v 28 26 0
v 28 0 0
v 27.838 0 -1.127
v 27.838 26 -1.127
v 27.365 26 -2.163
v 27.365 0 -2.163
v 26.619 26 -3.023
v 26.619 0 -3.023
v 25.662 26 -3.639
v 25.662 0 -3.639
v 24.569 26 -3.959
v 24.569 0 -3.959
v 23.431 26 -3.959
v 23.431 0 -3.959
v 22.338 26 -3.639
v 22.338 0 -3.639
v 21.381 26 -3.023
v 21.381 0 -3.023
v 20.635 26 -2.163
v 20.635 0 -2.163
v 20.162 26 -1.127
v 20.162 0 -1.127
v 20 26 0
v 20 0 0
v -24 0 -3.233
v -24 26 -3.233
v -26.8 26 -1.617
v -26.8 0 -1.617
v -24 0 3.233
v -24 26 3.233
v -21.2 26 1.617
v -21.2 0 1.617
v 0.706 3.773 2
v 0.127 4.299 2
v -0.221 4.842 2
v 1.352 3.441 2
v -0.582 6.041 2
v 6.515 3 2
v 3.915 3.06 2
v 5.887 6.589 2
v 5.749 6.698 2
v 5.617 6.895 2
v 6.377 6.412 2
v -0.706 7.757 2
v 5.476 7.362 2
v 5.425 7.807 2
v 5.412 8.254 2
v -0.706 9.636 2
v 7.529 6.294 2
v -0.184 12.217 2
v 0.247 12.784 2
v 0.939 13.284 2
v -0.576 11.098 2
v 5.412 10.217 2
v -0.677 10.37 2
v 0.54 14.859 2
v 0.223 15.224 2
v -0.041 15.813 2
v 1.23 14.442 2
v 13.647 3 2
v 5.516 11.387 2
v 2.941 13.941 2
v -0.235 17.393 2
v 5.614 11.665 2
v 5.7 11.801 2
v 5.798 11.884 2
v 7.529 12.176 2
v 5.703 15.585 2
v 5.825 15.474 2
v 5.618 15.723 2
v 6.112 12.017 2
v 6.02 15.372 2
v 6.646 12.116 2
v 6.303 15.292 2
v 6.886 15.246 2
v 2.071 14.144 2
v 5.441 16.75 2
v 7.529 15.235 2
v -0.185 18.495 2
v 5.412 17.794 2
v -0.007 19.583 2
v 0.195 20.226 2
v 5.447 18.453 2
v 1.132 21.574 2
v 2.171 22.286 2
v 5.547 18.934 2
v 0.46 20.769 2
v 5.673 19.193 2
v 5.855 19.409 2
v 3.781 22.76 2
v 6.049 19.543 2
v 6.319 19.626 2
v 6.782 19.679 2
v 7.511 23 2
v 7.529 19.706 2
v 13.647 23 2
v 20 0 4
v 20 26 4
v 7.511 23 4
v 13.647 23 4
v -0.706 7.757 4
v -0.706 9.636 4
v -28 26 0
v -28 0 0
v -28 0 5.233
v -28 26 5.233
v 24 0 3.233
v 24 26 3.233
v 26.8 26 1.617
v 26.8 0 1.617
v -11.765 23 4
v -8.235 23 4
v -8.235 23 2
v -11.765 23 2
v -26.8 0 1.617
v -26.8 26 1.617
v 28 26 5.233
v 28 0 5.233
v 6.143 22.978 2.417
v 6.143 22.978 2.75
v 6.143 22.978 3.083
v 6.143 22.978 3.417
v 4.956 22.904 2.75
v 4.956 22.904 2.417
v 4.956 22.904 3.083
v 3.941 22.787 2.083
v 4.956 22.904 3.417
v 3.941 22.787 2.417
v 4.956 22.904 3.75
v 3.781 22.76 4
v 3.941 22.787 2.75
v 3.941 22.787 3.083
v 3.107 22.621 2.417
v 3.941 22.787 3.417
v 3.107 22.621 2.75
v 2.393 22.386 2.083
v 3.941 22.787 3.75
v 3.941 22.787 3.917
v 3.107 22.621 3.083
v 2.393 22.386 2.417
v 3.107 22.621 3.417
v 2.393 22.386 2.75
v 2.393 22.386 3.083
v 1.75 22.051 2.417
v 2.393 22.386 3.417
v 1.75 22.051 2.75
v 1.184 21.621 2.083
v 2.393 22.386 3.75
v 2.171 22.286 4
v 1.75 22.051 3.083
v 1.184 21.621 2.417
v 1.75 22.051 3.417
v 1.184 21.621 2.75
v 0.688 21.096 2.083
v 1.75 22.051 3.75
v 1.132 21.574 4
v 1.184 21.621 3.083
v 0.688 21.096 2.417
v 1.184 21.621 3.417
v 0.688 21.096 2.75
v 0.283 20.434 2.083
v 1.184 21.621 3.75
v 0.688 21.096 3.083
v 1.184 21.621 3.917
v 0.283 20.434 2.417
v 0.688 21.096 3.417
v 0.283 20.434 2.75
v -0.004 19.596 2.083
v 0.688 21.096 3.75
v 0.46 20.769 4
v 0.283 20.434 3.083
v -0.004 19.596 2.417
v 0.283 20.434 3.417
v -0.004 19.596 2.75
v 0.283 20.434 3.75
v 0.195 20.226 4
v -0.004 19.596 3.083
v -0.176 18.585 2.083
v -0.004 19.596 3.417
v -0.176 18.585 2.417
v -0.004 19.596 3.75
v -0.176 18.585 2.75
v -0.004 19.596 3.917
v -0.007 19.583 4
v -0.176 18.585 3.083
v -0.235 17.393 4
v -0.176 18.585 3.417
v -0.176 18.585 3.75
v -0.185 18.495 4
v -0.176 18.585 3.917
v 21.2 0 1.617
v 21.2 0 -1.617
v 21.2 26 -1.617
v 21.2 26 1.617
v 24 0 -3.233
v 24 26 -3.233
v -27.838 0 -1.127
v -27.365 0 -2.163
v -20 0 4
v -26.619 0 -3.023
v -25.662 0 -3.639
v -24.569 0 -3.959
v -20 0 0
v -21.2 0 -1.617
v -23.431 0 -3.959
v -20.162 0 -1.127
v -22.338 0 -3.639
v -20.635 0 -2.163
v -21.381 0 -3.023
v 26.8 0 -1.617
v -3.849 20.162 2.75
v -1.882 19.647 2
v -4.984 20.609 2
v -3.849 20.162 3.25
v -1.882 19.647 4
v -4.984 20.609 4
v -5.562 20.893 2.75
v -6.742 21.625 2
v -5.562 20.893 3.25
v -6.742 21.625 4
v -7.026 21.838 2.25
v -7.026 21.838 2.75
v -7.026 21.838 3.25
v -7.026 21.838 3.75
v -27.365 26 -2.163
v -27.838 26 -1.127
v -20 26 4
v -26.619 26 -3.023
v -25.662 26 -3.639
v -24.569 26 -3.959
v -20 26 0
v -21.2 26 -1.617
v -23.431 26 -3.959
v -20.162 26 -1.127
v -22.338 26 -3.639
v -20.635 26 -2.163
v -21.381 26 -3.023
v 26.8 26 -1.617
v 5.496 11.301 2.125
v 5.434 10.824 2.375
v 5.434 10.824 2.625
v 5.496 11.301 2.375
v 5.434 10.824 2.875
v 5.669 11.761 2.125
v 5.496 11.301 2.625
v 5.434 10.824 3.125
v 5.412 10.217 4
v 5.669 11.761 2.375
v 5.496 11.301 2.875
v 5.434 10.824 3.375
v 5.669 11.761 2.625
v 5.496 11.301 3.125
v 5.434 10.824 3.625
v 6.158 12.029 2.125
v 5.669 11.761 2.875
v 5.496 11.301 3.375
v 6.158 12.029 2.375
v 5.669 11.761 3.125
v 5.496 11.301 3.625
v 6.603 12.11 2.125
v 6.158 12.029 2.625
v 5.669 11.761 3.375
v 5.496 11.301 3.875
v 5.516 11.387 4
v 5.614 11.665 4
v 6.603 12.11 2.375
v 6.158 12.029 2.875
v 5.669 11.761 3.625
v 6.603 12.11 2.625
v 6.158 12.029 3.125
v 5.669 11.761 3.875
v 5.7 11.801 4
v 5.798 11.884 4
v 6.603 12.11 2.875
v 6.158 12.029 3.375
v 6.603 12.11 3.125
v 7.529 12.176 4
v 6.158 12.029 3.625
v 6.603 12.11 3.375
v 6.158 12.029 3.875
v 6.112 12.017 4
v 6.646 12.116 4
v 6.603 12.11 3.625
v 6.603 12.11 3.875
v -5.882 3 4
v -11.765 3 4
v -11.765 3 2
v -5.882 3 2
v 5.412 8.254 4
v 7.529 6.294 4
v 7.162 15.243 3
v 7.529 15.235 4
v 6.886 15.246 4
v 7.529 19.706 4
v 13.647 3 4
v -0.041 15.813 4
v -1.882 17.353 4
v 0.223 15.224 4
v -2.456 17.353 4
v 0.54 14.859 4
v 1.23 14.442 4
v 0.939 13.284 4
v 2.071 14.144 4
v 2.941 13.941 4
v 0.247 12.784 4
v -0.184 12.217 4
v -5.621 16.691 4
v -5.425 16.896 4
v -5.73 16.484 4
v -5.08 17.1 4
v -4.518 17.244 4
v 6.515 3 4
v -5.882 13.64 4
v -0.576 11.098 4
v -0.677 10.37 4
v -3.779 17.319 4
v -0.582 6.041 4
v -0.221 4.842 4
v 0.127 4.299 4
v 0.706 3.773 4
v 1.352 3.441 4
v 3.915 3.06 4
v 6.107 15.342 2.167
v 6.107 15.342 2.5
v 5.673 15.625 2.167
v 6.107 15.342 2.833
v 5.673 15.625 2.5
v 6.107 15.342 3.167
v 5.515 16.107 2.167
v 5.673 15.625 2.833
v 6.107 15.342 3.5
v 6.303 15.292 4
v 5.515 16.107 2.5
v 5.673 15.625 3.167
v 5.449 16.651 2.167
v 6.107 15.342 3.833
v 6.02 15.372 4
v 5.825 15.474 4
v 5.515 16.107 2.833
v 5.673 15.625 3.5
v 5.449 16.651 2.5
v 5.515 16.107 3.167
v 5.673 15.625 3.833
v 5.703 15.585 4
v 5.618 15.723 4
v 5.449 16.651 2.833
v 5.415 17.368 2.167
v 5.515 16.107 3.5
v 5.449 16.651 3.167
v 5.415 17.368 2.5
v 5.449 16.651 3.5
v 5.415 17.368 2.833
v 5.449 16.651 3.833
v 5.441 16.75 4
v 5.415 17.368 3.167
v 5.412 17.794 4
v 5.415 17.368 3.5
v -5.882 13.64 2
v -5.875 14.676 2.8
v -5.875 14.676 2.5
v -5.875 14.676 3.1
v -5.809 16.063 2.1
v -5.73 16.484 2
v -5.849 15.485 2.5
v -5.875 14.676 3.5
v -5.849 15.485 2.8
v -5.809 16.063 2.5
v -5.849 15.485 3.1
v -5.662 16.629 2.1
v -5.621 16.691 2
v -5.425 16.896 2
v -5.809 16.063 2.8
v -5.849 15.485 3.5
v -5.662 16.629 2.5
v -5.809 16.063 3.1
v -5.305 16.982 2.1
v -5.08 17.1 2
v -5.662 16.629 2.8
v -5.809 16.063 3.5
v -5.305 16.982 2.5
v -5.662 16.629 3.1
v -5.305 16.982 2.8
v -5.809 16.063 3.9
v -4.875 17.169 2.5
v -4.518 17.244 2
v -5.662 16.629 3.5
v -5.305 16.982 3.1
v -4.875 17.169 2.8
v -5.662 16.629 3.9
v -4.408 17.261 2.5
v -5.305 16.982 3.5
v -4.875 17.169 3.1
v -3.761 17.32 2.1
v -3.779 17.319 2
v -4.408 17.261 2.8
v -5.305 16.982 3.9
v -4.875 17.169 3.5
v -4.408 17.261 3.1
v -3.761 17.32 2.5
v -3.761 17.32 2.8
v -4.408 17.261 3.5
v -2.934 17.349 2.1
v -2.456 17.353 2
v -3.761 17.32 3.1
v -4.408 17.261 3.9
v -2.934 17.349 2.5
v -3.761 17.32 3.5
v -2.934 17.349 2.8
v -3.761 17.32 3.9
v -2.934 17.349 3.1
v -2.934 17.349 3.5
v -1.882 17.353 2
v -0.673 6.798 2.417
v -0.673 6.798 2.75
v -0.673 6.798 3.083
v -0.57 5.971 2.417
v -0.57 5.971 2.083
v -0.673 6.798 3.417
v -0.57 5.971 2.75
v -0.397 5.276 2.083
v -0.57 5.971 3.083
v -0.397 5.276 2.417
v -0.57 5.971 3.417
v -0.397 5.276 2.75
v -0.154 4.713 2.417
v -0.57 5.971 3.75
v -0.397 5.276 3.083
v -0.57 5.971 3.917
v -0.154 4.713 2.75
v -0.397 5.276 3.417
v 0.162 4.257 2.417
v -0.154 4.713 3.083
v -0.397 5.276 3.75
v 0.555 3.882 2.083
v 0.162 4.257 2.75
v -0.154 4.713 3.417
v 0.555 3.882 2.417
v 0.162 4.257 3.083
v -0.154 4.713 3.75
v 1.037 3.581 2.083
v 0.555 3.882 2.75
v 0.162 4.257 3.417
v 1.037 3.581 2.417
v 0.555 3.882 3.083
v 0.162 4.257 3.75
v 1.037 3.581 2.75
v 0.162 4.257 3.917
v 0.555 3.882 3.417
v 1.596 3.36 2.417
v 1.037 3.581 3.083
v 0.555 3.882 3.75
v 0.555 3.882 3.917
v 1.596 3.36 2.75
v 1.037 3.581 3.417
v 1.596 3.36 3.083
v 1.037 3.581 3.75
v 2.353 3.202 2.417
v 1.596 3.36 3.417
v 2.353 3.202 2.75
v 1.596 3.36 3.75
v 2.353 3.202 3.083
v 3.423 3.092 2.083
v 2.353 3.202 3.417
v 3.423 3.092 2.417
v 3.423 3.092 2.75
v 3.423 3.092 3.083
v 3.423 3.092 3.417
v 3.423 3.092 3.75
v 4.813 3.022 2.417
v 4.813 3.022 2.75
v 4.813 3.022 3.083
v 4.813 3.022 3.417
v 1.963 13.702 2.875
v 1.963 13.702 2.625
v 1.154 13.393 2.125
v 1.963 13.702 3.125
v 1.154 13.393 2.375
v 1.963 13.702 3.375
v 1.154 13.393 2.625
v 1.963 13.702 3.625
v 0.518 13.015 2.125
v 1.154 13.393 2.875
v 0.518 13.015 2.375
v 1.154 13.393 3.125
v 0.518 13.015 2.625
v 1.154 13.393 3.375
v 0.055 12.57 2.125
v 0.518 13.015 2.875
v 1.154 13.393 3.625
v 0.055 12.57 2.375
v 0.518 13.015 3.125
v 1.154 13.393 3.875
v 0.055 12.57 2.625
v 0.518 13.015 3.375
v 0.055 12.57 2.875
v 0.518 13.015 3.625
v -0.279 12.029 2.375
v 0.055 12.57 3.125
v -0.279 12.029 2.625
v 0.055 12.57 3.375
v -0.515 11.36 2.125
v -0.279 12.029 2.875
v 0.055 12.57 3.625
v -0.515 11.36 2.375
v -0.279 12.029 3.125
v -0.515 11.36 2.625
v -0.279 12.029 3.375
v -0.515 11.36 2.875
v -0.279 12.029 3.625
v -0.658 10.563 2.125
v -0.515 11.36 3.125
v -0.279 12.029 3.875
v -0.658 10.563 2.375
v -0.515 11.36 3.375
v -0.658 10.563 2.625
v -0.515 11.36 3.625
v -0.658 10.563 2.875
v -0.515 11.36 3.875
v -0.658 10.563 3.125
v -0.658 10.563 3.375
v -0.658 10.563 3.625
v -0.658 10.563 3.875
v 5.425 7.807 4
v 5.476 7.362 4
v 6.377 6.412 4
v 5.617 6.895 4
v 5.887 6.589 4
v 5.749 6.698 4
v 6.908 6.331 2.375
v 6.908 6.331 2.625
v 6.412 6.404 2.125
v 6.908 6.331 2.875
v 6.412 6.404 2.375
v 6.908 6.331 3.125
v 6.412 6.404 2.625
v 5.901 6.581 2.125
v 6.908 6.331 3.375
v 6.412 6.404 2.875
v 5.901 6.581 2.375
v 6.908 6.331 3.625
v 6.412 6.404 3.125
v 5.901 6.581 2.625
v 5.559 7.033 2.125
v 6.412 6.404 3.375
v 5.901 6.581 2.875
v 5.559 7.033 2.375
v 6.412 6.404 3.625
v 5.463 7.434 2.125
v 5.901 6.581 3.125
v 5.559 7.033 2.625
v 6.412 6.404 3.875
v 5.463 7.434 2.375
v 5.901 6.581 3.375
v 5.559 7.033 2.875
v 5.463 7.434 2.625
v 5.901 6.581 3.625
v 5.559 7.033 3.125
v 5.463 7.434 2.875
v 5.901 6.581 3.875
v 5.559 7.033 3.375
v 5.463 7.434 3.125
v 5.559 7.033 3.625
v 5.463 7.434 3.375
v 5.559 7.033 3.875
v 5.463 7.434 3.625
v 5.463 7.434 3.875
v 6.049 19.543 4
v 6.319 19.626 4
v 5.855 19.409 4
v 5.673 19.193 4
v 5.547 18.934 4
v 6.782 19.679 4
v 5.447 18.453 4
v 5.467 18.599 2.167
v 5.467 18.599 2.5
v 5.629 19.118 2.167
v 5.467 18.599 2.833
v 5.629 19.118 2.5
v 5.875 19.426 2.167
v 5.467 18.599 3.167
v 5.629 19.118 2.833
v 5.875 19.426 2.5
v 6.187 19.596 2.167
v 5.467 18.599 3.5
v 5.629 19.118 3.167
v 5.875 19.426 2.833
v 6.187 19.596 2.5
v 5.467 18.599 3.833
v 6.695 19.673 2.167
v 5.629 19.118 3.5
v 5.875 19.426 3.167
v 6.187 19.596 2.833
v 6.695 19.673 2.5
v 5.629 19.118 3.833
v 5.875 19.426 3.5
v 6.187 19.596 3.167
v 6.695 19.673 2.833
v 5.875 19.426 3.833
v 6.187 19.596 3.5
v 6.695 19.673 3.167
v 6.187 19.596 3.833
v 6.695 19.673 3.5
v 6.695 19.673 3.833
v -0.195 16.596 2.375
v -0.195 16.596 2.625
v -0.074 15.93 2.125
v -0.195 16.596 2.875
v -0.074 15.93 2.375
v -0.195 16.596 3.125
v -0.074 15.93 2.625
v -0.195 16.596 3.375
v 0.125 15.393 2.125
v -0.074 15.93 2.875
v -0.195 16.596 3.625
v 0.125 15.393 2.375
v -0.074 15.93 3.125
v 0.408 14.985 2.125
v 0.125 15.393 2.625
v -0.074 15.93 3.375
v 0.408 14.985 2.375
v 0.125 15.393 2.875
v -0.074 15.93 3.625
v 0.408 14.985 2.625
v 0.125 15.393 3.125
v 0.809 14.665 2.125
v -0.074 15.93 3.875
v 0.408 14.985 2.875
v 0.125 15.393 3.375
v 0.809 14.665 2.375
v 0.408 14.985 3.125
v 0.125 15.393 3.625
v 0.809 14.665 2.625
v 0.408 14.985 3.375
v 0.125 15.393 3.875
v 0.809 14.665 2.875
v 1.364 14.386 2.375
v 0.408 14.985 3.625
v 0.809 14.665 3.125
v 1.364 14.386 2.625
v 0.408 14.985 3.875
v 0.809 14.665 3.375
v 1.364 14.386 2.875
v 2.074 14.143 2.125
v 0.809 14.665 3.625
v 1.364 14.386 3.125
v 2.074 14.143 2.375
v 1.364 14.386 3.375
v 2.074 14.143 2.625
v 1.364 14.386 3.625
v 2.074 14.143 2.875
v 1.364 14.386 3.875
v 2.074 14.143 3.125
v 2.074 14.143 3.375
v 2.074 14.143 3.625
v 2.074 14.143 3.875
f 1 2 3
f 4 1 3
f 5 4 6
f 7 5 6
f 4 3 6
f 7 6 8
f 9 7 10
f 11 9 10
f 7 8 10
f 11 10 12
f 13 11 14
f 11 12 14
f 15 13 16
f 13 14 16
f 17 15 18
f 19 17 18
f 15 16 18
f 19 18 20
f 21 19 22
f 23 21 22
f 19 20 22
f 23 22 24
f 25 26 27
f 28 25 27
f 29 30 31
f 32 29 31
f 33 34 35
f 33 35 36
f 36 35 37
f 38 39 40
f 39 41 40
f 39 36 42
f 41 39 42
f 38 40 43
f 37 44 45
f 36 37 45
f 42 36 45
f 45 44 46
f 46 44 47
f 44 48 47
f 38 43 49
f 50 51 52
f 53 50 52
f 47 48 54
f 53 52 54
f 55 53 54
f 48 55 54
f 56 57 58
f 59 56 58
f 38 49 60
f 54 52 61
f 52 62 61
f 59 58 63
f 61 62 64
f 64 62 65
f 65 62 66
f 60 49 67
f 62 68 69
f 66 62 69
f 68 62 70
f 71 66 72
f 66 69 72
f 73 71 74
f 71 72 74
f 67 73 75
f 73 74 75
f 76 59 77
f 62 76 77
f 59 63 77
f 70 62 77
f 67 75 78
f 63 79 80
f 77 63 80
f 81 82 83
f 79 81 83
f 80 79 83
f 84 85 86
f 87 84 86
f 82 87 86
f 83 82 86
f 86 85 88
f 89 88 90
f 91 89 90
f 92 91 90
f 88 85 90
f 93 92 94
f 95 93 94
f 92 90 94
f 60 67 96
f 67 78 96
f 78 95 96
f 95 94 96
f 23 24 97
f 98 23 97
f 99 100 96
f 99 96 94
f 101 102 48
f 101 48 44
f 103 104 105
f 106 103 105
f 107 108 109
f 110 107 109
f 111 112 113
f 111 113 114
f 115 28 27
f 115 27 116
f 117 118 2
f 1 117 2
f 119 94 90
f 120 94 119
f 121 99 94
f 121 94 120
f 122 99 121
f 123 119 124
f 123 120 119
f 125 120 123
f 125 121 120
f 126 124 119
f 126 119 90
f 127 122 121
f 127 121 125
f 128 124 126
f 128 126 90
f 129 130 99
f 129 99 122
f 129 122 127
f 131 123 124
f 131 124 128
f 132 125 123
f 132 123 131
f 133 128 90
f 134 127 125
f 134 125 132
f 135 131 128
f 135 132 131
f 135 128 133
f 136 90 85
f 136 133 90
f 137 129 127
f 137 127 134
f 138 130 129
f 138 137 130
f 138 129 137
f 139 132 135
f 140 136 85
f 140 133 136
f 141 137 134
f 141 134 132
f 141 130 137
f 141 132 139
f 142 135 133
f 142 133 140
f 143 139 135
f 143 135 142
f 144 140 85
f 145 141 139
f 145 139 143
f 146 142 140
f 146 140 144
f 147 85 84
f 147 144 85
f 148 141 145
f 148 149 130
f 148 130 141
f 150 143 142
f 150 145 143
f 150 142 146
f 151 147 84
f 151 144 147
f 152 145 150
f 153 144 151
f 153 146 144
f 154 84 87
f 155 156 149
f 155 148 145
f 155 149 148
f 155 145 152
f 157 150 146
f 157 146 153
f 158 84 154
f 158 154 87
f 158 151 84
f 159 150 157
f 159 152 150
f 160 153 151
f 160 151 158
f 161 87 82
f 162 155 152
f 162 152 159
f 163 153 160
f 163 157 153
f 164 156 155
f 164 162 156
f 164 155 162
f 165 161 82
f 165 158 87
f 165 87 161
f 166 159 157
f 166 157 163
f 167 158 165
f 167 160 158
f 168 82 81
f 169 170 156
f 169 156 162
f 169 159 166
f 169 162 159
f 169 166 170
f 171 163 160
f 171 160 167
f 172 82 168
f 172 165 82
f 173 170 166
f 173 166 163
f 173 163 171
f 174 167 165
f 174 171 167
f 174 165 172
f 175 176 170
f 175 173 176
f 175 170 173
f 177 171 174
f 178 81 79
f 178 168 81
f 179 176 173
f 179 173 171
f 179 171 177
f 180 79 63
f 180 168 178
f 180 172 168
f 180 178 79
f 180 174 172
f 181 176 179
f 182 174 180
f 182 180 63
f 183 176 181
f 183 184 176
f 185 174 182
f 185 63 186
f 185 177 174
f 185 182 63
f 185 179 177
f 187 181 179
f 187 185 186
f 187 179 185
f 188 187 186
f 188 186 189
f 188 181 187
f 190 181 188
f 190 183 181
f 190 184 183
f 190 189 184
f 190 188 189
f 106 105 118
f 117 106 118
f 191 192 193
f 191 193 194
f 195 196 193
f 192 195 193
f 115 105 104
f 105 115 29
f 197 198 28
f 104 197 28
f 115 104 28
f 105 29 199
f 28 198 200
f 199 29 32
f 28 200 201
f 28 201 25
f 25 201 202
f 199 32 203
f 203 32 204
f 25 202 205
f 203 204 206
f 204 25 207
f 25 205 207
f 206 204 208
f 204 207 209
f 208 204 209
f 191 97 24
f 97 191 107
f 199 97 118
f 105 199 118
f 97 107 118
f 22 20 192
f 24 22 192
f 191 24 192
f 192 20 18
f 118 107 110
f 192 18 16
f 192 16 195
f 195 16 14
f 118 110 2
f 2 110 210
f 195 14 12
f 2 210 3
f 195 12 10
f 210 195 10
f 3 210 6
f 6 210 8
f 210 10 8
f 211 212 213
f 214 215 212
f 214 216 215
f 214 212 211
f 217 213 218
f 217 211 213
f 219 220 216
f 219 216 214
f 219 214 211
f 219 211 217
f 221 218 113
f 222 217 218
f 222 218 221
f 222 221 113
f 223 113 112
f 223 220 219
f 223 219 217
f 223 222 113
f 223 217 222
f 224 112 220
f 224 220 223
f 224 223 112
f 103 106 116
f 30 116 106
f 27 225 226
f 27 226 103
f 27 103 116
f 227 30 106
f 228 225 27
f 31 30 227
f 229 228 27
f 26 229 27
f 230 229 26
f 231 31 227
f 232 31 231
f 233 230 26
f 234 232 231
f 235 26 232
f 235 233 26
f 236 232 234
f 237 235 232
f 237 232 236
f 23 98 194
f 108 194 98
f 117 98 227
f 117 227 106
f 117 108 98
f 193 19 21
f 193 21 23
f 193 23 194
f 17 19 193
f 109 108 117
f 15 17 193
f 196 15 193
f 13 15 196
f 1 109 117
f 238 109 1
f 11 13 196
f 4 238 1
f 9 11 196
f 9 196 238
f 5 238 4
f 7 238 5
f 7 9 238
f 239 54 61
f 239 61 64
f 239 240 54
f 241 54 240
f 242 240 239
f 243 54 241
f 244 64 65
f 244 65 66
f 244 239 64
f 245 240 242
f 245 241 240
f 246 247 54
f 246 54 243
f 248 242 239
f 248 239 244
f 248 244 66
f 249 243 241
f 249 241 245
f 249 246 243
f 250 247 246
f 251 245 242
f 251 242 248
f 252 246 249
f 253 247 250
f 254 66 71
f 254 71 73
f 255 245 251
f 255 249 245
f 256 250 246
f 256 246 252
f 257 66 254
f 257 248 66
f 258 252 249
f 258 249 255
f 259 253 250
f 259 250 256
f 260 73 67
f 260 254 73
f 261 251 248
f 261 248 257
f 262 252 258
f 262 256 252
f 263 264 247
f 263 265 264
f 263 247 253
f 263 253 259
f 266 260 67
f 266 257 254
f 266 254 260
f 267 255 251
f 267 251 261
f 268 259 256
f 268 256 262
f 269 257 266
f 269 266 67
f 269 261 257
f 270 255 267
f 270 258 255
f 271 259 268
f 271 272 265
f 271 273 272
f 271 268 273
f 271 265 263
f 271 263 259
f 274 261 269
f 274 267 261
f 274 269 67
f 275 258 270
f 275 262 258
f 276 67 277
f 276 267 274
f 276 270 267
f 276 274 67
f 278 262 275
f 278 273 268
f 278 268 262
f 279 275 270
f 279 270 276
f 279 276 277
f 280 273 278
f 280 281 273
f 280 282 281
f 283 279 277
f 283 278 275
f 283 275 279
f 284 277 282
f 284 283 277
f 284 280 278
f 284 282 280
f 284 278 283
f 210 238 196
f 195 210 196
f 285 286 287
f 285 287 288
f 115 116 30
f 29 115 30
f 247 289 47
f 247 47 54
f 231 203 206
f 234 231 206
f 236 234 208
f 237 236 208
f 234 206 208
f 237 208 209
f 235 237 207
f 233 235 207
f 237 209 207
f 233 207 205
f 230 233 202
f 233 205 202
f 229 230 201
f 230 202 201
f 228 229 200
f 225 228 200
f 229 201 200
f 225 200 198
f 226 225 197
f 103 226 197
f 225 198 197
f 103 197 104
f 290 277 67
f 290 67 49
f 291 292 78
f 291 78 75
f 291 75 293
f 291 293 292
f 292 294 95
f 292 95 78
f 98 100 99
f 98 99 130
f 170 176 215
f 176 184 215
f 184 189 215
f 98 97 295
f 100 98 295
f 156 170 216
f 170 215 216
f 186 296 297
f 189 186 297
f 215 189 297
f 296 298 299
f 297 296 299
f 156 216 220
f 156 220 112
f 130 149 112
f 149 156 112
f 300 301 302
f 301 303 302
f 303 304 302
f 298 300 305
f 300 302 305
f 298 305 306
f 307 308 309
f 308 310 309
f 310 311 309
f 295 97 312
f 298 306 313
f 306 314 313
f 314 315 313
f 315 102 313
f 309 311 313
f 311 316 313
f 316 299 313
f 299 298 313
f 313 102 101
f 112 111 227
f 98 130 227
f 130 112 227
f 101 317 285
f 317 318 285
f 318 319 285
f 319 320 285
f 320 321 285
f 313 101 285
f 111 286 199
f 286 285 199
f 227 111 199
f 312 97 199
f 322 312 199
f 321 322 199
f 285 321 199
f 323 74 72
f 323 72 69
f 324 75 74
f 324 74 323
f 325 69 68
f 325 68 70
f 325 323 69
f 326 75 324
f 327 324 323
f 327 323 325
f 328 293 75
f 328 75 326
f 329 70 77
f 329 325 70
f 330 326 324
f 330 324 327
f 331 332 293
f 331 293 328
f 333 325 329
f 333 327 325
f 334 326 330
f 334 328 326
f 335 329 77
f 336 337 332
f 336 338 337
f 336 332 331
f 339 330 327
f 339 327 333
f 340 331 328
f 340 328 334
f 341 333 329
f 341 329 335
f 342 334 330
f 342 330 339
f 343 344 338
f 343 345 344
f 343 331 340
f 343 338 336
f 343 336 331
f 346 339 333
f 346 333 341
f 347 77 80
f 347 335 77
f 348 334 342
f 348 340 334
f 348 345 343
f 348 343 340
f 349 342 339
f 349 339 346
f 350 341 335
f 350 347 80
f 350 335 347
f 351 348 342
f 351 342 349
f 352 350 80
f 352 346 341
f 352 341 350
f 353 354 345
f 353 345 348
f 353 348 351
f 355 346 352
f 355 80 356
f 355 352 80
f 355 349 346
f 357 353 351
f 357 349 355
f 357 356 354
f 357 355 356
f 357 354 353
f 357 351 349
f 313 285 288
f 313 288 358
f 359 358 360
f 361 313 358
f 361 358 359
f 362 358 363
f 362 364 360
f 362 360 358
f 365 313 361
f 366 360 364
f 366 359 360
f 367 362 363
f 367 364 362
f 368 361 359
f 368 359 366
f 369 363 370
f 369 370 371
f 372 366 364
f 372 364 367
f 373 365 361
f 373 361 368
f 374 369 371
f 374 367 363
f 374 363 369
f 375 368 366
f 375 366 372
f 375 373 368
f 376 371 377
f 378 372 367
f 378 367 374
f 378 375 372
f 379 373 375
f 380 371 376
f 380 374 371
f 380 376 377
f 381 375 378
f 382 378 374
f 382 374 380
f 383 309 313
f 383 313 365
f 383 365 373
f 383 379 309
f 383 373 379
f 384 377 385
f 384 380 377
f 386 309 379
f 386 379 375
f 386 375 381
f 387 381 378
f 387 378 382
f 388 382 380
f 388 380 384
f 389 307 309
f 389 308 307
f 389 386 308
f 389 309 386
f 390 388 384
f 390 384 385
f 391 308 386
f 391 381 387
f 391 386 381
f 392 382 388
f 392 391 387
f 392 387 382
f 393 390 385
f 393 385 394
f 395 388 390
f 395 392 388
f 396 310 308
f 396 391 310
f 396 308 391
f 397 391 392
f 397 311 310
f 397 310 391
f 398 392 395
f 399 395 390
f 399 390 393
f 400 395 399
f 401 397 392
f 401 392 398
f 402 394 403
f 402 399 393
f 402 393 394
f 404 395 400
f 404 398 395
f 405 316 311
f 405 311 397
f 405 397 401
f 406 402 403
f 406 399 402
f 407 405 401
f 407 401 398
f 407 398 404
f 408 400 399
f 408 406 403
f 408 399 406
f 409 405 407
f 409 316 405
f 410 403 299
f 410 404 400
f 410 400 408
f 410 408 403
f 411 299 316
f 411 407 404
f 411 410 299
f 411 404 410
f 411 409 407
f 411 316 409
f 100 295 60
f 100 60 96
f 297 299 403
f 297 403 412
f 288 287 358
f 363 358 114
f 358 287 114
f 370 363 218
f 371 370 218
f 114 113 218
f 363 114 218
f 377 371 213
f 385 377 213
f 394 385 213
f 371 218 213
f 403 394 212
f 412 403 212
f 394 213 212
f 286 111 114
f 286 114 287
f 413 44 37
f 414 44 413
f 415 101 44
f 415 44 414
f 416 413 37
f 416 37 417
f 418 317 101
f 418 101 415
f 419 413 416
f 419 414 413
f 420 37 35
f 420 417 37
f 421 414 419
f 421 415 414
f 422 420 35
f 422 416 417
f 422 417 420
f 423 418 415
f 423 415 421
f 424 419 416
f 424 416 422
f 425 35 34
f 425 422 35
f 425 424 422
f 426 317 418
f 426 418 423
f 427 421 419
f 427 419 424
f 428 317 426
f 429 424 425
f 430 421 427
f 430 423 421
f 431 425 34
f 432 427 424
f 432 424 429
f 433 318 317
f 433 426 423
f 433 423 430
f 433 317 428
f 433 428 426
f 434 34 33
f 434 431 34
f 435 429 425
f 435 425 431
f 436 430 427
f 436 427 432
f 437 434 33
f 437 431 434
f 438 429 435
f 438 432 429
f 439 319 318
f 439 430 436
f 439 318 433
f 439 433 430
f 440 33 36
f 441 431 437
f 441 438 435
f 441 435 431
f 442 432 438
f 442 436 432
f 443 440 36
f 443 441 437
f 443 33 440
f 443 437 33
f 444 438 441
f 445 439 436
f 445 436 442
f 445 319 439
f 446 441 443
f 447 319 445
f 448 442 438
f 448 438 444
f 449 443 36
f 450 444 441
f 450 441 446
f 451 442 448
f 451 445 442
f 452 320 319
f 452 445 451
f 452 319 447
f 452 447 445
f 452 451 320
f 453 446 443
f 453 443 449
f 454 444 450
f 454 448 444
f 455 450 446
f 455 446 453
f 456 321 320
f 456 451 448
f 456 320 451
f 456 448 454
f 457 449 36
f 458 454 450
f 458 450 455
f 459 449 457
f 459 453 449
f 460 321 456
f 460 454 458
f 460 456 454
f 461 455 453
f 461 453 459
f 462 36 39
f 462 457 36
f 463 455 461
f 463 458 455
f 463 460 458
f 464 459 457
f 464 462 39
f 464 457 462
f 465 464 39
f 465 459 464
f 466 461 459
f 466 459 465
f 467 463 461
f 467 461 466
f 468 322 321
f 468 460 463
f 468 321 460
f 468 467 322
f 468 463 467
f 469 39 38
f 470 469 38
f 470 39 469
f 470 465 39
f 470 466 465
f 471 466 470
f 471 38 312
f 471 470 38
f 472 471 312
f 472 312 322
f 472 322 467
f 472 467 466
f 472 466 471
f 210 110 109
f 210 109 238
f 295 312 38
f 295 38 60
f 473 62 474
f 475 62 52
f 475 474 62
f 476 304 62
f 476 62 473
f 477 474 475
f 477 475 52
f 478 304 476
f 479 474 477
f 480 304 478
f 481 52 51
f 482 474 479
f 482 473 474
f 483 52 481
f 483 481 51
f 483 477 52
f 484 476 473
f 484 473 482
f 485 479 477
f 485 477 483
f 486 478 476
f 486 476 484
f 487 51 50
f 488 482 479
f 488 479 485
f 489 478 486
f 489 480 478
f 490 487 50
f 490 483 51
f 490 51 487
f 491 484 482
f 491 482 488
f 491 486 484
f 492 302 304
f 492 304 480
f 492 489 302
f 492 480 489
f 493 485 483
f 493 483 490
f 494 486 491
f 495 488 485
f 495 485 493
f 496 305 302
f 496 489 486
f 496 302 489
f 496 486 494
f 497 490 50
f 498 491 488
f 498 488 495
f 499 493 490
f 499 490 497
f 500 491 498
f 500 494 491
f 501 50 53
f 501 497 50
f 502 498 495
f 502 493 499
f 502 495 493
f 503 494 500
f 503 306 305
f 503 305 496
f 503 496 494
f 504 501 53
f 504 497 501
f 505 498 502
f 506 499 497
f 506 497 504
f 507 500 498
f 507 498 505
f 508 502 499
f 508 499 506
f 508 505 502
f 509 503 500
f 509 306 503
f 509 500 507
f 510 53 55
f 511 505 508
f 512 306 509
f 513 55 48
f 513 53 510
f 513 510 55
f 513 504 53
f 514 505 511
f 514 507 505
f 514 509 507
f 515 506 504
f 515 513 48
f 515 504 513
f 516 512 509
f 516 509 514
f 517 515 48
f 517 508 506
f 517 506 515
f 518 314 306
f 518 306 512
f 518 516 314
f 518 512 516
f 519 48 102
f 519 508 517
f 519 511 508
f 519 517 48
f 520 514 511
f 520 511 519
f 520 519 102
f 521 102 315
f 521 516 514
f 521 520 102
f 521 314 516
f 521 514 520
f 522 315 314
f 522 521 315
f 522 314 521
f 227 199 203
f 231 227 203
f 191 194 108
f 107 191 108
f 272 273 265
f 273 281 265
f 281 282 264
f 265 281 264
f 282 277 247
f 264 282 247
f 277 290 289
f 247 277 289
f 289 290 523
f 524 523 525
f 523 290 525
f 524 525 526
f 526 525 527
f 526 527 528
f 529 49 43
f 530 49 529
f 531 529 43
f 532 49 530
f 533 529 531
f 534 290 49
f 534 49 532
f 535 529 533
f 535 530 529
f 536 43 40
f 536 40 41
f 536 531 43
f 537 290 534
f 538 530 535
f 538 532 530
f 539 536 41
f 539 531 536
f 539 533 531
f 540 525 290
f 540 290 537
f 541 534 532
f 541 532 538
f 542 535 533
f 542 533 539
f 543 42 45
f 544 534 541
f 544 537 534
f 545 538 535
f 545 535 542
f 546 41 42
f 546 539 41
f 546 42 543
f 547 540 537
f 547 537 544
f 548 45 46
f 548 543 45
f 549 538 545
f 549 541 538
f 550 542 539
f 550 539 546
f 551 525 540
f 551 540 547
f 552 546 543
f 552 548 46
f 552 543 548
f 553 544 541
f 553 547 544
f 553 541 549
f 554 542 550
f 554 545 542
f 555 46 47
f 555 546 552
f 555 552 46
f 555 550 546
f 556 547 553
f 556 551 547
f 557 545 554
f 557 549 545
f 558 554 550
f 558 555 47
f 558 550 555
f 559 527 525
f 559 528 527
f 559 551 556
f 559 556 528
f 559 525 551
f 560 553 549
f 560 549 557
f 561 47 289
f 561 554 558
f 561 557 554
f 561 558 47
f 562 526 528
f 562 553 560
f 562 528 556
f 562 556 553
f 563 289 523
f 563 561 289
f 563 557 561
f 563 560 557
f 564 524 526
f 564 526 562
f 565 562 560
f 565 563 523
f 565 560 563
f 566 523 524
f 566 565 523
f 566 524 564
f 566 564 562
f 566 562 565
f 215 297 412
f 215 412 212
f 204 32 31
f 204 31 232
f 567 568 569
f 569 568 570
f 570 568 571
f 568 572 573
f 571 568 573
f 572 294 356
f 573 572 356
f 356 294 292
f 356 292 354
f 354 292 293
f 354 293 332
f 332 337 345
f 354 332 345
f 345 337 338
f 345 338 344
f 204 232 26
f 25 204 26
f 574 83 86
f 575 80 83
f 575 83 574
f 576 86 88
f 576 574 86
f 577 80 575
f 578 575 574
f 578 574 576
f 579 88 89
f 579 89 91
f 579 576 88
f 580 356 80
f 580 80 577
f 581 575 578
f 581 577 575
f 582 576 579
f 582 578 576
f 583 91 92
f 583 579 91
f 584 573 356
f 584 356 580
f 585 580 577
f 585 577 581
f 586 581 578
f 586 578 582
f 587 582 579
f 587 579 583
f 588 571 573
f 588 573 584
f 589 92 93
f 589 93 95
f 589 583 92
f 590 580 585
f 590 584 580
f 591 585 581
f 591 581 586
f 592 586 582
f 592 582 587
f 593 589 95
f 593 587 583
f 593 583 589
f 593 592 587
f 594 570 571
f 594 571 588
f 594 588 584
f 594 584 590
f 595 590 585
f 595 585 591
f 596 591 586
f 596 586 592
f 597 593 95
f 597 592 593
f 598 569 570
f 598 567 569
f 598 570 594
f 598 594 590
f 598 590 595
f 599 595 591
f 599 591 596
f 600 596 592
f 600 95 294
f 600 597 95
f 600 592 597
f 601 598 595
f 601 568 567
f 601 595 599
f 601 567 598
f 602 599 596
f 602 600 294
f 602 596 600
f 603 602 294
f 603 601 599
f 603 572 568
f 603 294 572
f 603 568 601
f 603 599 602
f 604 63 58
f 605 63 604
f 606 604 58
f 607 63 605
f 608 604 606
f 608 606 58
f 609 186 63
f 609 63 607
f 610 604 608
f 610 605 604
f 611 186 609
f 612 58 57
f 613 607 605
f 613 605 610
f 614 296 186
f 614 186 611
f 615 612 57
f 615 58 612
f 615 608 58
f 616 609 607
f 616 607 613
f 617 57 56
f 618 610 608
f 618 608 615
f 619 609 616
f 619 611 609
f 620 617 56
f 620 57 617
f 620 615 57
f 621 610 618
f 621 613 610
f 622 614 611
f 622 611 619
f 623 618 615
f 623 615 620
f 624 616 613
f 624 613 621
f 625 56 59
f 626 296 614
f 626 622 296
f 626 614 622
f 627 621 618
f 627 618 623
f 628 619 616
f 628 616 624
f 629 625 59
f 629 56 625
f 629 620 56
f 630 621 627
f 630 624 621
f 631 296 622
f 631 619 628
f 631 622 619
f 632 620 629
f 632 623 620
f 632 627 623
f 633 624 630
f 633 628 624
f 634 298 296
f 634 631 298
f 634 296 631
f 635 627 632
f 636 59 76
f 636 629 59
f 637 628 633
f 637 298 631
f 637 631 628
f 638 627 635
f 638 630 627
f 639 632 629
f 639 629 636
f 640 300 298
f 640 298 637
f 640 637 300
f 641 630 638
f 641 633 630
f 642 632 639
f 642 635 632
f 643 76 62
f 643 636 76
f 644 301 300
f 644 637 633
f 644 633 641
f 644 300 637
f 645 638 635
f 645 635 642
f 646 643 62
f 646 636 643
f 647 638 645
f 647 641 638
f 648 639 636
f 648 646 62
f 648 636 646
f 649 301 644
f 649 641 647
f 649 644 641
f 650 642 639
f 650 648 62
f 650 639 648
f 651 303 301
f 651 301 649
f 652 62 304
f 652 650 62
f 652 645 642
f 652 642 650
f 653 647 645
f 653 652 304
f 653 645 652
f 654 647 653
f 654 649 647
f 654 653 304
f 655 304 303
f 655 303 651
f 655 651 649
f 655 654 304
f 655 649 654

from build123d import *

# Parameters (mm, degrees)
BOSS_EXTRUDE1_DEPTH = 26
BOSS_EXTRUDE2_DEPTH = 2


with BuildPart() as part:
    # Sketch1 → Boss-Extrude1 (new body)
    with BuildSketch(Plane(origin=(0, 0, 0), x_dir=(1, 0, 0), z_dir=(0, 1, 0))):
        with BuildLine():
            Line((-28, 0), (-28, -5.233161507))
            Line((-28, -5.233161507), (28, -5.233161507))
            Line((28, -5.233161507), (28, 0))
            ThreePointArc((28, 0), (24, 4), (20, 0))
            Line((20, 0), (20, -4))
            Line((20, -4), (-20, -4))
            Line((-20, -4), (-20, 0))
            ThreePointArc((-20, 0), (-24, 4), (-28, 0))
        make_face()
        Polygon((-24, -3.233161507), (-21.2, -1.616580754), (-21.2, 1.616580754), (-24, 3.233161507), (-26.8, 1.616580754), (-26.8, -1.616580754), align=None, mode=Mode.SUBTRACT)
        Polygon((24, -3.233161507), (26.8, -1.616580754), (26.8, 1.616580754), (24, 3.233161507), (21.2, 1.616580754), (21.2, -1.616580754), align=None, mode=Mode.SUBTRACT)
    extrude(amount=BOSS_EXTRUDE1_DEPTH)

    # Sketch2 → Boss-Extrude2 (add)
    # profile 1 of 2: a face of its own
    with BuildSketch(Plane(origin=(0, 0, 4), x_dir=(-1, 0, 0), z_dir=(0, 0, -1))):
        with BuildLine():
            Line((-13.647058824, 23), (-7.511029412, 23))
            add(Edge.make_bspline(
                [(-7.511029412, 23), (-7.275731179, 22.997981779), (-6.819798363, 22.994071112), (-6.159048704, 22.98133809), (-5.542304381, 22.952753821), (-4.97019879, 22.906571513), (-4.43999705, 22.85840676), (-3.95570662, 22.791983867), (-3.515425024, 22.714754032), (-3.113311884, 22.62754473), (-2.741946911, 22.520639825), (-2.392633853, 22.391003364), (-2.061356263, 22.237036075), (-1.749186518, 22.056973854), (-1.455538155, 21.852418481), (-1.180448032, 21.624572715), (-0.921358069, 21.373380515), (-0.680179003, 21.096140802), (-0.459212321, 20.785039798), (-0.272594718, 20.428388227), (-0.114539747, 20.02893381), (0.01166681, 19.585017574), (0.11595967, 19.100276176), (0.182028181, 18.570062266), (0.228008391, 17.997136115), (0.232808413, 17.599367786), (0.235294118, 17.393382353)],
                knots=[0, 0, 0, 0, 1.509097582, 2.924149082, 4.238183516, 5.467880876, 6.60497888, 7.652028453, 8.60175528, 9.471282623, 10.289610236, 11.077949411, 11.85853237, 12.62964082, 13.386192643, 14.150986854, 14.917998976, 15.698027796, 16.504800181, 17.359170498, 18.272796439, 19.255228546, 20.31576025, 21.449539682, 22.679237042, 24, 24, 24, 24], degree=3))
            add(Edge.make_bspline(
                [(0.235294118, 17.393382353), (0.232974752, 17.254856933), (0.228515198, 16.98850749), (0.200383988, 16.605202315), (0.149069438, 16.255170164), (0.079129695, 15.936955638), (-0.005906464, 15.649717168), (-0.117746792, 15.395642258), (-0.249513114, 15.174191871), (-0.404256499, 14.979905609), (-0.591024507, 14.809913361), (-0.814712612, 14.657824833), (-1.072004992, 14.508015165), (-1.37363652, 14.380830632), (-1.707083821, 14.248019836), (-2.08498403, 14.138316996), (-2.498813667, 14.030114219), (-2.790094496, 13.971551743), (-2.941176471, 13.941176471)],
                knots=[0, 0, 0, 0, 1.248797497, 2.401122606, 3.461961877, 4.434949853, 5.336516199, 6.157599865, 6.930603047, 7.653512509, 8.388476874, 9.197582017, 10.088252902, 11.067492471, 12.144601044, 13.32232985, 14.611142055, 16, 16, 16, 16], degree=3))
            add(Edge.make_bspline(
                [(-2.941176471, 13.941176471), (-2.770371191, 13.906426369), (-2.441331923, 13.839483779), (-1.972356815, 13.710080705), (-1.546384653, 13.563684789), (-1.161438092, 13.403562089), (-0.820288891, 13.222788974), (-0.522021254, 13.024823635), (-0.263588432, 12.811780764), (-0.05097915, 12.573648761), (0.133439784, 12.315749283), (0.287925528, 12.026254146), (0.414834382, 11.704673071), (0.522237978, 11.351932642), (0.605600404, 10.96831546), (0.663113943, 10.5516397), (0.701055467, 10.10487322), (0.704241313, 9.795426457), (0.705882353, 9.636029412)],
                knots=[0, 0, 0, 0, 1.318474424, 2.539908949, 3.677602242, 4.724633259, 5.691096321, 6.593718157, 7.429479115, 8.217211742, 9.001882654, 9.823273564, 10.69276163, 11.613722017, 12.610358031, 13.659357769, 14.794327495, 16, 16, 16, 16], degree=3))
            Line((0.705882353, 9.636029412), (0.705882353, 7.757352941))
            add(Edge.make_bspline(
                [(0.705882353, 7.757352941), (0.704799402, 7.591884318), (0.702704249, 7.27175714), (0.67738761, 6.807934298), (0.632072604, 6.377720507), (0.577490967, 5.978821137), (0.492846489, 5.615803116), (0.405671971, 5.281599354), (0.28994872, 4.983831187), (0.160842329, 4.715033057), (0.012977275, 4.472562188), (-0.158442094, 4.255363641), (-0.345211479, 4.055514692), (-0.555509379, 3.876624389), (-0.785166734, 3.715553429), (-1.037562672, 3.576418256), (-1.307049122, 3.453168174), (-1.607705683, 3.35203056), (-1.957946085, 3.265715552), (-2.377158841, 3.195476641), (-2.873785211, 3.13277364), (-3.4493738, 3.088655391), (-4.103756338, 3.047411202), (-4.83799783, 3.018157261), (-5.650694295, 3.005897294), (-6.218135233, 3.002024237), (-6.514705882, 3)],
                knots=[0, 0, 0, 0, 1.152396282, 2.229506502, 3.233379135, 4.165256051, 5.030866667, 5.828132484, 6.56839727, 7.251703786, 7.90313474, 8.541689401, 9.175664088, 9.805199082, 10.461088127, 11.125968039, 11.809754162, 12.52233939, 13.331757138, 14.319645788, 15.481015661, 16.817142782, 18.339330194, 20.047761731, 21.934379081, 24, 24, 24, 24], degree=3))
            Line((-6.514705882, 3), (-13.647058824, 3))
            Line((-13.647058824, 3), (-13.647058824, 23))
        make_face()
        with BuildLine():
            Line((-7.529411765, 19.705882353), (-7.529411765, 15.235294118))
            add(Edge.make_bspline(
                [(-7.529411765, 15.235294118), (-7.406866635, 15.237978484), (-7.192422866, 15.242675901), (-6.977943364, 15.24522929), (-6.886029412, 15.246323529)],
                knots=[0, 0, 0, 0, 1.142911548, 2, 2, 2, 2], degree=3))
            add(Edge.make_bspline(
                [(-6.886029412, 15.246323529), (-6.740947301, 15.248687273), (-6.477856737, 15.252973663), (-6.125517198, 15.325927539), (-5.851081785, 15.437107788), (-5.684278021, 15.590100017), (-5.601180942, 15.752298454), (-5.553614641, 15.915978468), (-5.509206909, 16.121100191), (-5.474341123, 16.370628298), (-5.445721739, 16.665000056), (-5.423400941, 17.002143802), (-5.413861666, 17.38352185), (-5.412490731, 17.651958103), (-5.411764706, 17.794117647)],
                knots=[0, 0, 0, 0, 1.48265011, 2.688624062, 3.665886862, 4.482415445, 4.937118978, 5.516533753, 6.222944153, 7.08542788, 8.094324435, 9.251250026, 10.544306002, 12, 12, 12, 12], degree=3))
            add(Edge.make_bspline(
                [(-5.411764706, 17.794117647), (-5.414328018, 17.940093199), (-5.419057143, 18.209407536), (-5.458346473, 18.577258961), (-5.518349704, 18.87773136), (-5.617120488, 19.109882781), (-5.733904141, 19.290128296), (-5.868891145, 19.428124069), (-6.017897311, 19.536117272), (-6.198796129, 19.605125943), (-6.426159943, 19.646746329), (-6.722318383, 19.677870943), (-7.099011903, 19.698357172), (-7.37742421, 19.703224978), (-7.529411765, 19.705882353)],
                knots=[0, 0, 0, 0, 1.519775244, 2.803875429, 3.850524394, 4.696904465, 5.415553468, 6.074478191, 6.697696669, 7.316323432, 8.072315065, 9.09987747, 10.416799398, 12, 12, 12, 12], degree=3))
        make_face(mode=Mode.SUBTRACT)
        with BuildLine():
            Line((-7.529411765, 12.176470588), (-7.529411765, 6.294117647))
            add(Edge.make_bspline(
                [(-7.529411765, 6.294117647), (-7.420324785, 6.298478074), (-7.213005859, 6.306765029), (-6.918337489, 6.326902982), (-6.654951975, 6.361663585), (-6.420932841, 6.399065544), (-6.218252281, 6.450542123), (-6.047062066, 6.509147737), (-5.904616172, 6.57395291), (-5.788177353, 6.653131279), (-5.695063658, 6.755503737), (-5.618691129, 6.883359348), (-5.55127953, 7.03989887), (-5.504628482, 7.228008812), (-5.457915355, 7.44189207), (-5.430019896, 7.68684309), (-5.417623422, 7.96064691), (-5.413774101, 8.153174564), (-5.411764706, 8.253676471)],
                knots=[0, 0, 0, 0, 1.50566656, 2.861507154, 4.071047619, 5.168542278, 6.12771314, 6.950823291, 7.661450358, 8.28034255, 8.878344747, 9.553732332, 10.32599646, 11.219809833, 12.220801373, 13.344401423, 14.613743465, 16, 16, 16, 16], degree=3))
            Line((-5.411764706, 8.253676471), (-5.411764706, 10.216911765))
            add(Edge.make_bspline(
                [(-5.411764706, 10.216911765), (-5.411625539, 10.323574104), (-5.411361354, 10.526054691), (-5.431934549, 10.812872087), (-5.455941272, 11.068312667), (-5.490634178, 11.28988458), (-5.538399387, 11.478501022), (-5.596797759, 11.632421229), (-5.660721533, 11.759017199), (-5.746931785, 11.854699599), (-5.860081356, 11.921764358), (-5.99584109, 11.985178234), (-6.168589838, 12.034357698), (-6.373799547, 12.077524186), (-6.614452953, 12.113799181), (-6.88926906, 12.14220067), (-7.198264679, 12.164205556), (-7.415407511, 12.172248096), (-7.529411765, 12.176470588)],
                knots=[0, 0, 0, 0, 1.448679605, 2.750075608, 3.904849468, 4.934080626, 5.79427915, 6.542621099, 7.168507459, 7.710604877, 8.264840309, 8.942819976, 9.743425019, 10.697014228, 11.792022656, 13.047885967, 14.450082115, 16, 16, 16, 16], degree=3))
        make_face(mode=Mode.SUBTRACT)
    # profile 2 of 2: a face of its own
    with BuildSketch(Plane(origin=(0, 0, 4), x_dir=(-1, 0, 0), z_dir=(0, 0, -1))):
        with BuildLine():
            Line((11.764705882, 23), (11.764705882, 3))
            Line((11.764705882, 3), (5.882352941, 3))
            Line((5.882352941, 3), (5.882352941, 13.639705882))
            add(Edge.make_bspline(
                [(5.882352941, 13.639705882), (5.880947737, 13.82230104), (5.878288215, 14.167884759), (5.877255074, 14.65816143), (5.865236193, 15.090768646), (5.851316968, 15.465840003), (5.833299033, 15.783338952), (5.812277963, 16.043366084), (5.787966916, 16.246039236), (5.751675327, 16.439313374), (5.671063802, 16.635997331), (5.513570677, 16.831585631), (5.300972739, 16.994325057), (5.081905966, 17.105669586), (4.863856573, 17.175428694), (4.65061388, 17.221357274), (4.394651874, 17.266432937), (4.092334468, 17.296767422), (3.746641909, 17.32251546), (3.355542137, 17.340185318), (2.920406806, 17.351060405), (2.615203504, 17.352296115), (2.455882353, 17.352941176)],
                knots=[0, 0, 0, 0, 1.706209308, 3.229210257, 4.580842603, 5.749723113, 6.736155842, 7.552061302, 8.186936249, 8.642816617, 9.387119351, 10.145384432, 10.960888028, 11.872433023, 12.426467721, 13.095924105, 13.909173589, 14.853778768, 15.933135423, 17.148271002, 18.511350491, 20, 20, 20, 20], degree=3))
            Line((2.455882353, 17.352941176), (1.882352941, 17.352941176))
            Line((1.882352941, 17.352941176), (1.882352941, 19.647058824))
            add(Edge.make_bspline(
                [(1.882352941, 19.647058824), (2.221677388, 19.719791453), (2.884869887, 19.861943704), (3.838958585, 20.14553208), (4.730122825, 20.484470888), (5.558298884, 20.876645002), (6.325128134, 21.323798016), (7.029371007, 21.823696326), (7.671429441, 22.379342308), (8.048042826, 22.79388857), (8.235294118, 23)],
                knots=[0, 0, 0, 0, 1.137311521, 2.22281794, 3.259150006, 4.260062448, 5.223308807, 6.165267245, 7.087775173, 8, 8, 8, 8], degree=3))
            Line((8.235294118, 23), (11.764705882, 23))
        make_face()
    extrude(amount=BOSS_EXTRUDE2_DEPTH)


solid = part.part
